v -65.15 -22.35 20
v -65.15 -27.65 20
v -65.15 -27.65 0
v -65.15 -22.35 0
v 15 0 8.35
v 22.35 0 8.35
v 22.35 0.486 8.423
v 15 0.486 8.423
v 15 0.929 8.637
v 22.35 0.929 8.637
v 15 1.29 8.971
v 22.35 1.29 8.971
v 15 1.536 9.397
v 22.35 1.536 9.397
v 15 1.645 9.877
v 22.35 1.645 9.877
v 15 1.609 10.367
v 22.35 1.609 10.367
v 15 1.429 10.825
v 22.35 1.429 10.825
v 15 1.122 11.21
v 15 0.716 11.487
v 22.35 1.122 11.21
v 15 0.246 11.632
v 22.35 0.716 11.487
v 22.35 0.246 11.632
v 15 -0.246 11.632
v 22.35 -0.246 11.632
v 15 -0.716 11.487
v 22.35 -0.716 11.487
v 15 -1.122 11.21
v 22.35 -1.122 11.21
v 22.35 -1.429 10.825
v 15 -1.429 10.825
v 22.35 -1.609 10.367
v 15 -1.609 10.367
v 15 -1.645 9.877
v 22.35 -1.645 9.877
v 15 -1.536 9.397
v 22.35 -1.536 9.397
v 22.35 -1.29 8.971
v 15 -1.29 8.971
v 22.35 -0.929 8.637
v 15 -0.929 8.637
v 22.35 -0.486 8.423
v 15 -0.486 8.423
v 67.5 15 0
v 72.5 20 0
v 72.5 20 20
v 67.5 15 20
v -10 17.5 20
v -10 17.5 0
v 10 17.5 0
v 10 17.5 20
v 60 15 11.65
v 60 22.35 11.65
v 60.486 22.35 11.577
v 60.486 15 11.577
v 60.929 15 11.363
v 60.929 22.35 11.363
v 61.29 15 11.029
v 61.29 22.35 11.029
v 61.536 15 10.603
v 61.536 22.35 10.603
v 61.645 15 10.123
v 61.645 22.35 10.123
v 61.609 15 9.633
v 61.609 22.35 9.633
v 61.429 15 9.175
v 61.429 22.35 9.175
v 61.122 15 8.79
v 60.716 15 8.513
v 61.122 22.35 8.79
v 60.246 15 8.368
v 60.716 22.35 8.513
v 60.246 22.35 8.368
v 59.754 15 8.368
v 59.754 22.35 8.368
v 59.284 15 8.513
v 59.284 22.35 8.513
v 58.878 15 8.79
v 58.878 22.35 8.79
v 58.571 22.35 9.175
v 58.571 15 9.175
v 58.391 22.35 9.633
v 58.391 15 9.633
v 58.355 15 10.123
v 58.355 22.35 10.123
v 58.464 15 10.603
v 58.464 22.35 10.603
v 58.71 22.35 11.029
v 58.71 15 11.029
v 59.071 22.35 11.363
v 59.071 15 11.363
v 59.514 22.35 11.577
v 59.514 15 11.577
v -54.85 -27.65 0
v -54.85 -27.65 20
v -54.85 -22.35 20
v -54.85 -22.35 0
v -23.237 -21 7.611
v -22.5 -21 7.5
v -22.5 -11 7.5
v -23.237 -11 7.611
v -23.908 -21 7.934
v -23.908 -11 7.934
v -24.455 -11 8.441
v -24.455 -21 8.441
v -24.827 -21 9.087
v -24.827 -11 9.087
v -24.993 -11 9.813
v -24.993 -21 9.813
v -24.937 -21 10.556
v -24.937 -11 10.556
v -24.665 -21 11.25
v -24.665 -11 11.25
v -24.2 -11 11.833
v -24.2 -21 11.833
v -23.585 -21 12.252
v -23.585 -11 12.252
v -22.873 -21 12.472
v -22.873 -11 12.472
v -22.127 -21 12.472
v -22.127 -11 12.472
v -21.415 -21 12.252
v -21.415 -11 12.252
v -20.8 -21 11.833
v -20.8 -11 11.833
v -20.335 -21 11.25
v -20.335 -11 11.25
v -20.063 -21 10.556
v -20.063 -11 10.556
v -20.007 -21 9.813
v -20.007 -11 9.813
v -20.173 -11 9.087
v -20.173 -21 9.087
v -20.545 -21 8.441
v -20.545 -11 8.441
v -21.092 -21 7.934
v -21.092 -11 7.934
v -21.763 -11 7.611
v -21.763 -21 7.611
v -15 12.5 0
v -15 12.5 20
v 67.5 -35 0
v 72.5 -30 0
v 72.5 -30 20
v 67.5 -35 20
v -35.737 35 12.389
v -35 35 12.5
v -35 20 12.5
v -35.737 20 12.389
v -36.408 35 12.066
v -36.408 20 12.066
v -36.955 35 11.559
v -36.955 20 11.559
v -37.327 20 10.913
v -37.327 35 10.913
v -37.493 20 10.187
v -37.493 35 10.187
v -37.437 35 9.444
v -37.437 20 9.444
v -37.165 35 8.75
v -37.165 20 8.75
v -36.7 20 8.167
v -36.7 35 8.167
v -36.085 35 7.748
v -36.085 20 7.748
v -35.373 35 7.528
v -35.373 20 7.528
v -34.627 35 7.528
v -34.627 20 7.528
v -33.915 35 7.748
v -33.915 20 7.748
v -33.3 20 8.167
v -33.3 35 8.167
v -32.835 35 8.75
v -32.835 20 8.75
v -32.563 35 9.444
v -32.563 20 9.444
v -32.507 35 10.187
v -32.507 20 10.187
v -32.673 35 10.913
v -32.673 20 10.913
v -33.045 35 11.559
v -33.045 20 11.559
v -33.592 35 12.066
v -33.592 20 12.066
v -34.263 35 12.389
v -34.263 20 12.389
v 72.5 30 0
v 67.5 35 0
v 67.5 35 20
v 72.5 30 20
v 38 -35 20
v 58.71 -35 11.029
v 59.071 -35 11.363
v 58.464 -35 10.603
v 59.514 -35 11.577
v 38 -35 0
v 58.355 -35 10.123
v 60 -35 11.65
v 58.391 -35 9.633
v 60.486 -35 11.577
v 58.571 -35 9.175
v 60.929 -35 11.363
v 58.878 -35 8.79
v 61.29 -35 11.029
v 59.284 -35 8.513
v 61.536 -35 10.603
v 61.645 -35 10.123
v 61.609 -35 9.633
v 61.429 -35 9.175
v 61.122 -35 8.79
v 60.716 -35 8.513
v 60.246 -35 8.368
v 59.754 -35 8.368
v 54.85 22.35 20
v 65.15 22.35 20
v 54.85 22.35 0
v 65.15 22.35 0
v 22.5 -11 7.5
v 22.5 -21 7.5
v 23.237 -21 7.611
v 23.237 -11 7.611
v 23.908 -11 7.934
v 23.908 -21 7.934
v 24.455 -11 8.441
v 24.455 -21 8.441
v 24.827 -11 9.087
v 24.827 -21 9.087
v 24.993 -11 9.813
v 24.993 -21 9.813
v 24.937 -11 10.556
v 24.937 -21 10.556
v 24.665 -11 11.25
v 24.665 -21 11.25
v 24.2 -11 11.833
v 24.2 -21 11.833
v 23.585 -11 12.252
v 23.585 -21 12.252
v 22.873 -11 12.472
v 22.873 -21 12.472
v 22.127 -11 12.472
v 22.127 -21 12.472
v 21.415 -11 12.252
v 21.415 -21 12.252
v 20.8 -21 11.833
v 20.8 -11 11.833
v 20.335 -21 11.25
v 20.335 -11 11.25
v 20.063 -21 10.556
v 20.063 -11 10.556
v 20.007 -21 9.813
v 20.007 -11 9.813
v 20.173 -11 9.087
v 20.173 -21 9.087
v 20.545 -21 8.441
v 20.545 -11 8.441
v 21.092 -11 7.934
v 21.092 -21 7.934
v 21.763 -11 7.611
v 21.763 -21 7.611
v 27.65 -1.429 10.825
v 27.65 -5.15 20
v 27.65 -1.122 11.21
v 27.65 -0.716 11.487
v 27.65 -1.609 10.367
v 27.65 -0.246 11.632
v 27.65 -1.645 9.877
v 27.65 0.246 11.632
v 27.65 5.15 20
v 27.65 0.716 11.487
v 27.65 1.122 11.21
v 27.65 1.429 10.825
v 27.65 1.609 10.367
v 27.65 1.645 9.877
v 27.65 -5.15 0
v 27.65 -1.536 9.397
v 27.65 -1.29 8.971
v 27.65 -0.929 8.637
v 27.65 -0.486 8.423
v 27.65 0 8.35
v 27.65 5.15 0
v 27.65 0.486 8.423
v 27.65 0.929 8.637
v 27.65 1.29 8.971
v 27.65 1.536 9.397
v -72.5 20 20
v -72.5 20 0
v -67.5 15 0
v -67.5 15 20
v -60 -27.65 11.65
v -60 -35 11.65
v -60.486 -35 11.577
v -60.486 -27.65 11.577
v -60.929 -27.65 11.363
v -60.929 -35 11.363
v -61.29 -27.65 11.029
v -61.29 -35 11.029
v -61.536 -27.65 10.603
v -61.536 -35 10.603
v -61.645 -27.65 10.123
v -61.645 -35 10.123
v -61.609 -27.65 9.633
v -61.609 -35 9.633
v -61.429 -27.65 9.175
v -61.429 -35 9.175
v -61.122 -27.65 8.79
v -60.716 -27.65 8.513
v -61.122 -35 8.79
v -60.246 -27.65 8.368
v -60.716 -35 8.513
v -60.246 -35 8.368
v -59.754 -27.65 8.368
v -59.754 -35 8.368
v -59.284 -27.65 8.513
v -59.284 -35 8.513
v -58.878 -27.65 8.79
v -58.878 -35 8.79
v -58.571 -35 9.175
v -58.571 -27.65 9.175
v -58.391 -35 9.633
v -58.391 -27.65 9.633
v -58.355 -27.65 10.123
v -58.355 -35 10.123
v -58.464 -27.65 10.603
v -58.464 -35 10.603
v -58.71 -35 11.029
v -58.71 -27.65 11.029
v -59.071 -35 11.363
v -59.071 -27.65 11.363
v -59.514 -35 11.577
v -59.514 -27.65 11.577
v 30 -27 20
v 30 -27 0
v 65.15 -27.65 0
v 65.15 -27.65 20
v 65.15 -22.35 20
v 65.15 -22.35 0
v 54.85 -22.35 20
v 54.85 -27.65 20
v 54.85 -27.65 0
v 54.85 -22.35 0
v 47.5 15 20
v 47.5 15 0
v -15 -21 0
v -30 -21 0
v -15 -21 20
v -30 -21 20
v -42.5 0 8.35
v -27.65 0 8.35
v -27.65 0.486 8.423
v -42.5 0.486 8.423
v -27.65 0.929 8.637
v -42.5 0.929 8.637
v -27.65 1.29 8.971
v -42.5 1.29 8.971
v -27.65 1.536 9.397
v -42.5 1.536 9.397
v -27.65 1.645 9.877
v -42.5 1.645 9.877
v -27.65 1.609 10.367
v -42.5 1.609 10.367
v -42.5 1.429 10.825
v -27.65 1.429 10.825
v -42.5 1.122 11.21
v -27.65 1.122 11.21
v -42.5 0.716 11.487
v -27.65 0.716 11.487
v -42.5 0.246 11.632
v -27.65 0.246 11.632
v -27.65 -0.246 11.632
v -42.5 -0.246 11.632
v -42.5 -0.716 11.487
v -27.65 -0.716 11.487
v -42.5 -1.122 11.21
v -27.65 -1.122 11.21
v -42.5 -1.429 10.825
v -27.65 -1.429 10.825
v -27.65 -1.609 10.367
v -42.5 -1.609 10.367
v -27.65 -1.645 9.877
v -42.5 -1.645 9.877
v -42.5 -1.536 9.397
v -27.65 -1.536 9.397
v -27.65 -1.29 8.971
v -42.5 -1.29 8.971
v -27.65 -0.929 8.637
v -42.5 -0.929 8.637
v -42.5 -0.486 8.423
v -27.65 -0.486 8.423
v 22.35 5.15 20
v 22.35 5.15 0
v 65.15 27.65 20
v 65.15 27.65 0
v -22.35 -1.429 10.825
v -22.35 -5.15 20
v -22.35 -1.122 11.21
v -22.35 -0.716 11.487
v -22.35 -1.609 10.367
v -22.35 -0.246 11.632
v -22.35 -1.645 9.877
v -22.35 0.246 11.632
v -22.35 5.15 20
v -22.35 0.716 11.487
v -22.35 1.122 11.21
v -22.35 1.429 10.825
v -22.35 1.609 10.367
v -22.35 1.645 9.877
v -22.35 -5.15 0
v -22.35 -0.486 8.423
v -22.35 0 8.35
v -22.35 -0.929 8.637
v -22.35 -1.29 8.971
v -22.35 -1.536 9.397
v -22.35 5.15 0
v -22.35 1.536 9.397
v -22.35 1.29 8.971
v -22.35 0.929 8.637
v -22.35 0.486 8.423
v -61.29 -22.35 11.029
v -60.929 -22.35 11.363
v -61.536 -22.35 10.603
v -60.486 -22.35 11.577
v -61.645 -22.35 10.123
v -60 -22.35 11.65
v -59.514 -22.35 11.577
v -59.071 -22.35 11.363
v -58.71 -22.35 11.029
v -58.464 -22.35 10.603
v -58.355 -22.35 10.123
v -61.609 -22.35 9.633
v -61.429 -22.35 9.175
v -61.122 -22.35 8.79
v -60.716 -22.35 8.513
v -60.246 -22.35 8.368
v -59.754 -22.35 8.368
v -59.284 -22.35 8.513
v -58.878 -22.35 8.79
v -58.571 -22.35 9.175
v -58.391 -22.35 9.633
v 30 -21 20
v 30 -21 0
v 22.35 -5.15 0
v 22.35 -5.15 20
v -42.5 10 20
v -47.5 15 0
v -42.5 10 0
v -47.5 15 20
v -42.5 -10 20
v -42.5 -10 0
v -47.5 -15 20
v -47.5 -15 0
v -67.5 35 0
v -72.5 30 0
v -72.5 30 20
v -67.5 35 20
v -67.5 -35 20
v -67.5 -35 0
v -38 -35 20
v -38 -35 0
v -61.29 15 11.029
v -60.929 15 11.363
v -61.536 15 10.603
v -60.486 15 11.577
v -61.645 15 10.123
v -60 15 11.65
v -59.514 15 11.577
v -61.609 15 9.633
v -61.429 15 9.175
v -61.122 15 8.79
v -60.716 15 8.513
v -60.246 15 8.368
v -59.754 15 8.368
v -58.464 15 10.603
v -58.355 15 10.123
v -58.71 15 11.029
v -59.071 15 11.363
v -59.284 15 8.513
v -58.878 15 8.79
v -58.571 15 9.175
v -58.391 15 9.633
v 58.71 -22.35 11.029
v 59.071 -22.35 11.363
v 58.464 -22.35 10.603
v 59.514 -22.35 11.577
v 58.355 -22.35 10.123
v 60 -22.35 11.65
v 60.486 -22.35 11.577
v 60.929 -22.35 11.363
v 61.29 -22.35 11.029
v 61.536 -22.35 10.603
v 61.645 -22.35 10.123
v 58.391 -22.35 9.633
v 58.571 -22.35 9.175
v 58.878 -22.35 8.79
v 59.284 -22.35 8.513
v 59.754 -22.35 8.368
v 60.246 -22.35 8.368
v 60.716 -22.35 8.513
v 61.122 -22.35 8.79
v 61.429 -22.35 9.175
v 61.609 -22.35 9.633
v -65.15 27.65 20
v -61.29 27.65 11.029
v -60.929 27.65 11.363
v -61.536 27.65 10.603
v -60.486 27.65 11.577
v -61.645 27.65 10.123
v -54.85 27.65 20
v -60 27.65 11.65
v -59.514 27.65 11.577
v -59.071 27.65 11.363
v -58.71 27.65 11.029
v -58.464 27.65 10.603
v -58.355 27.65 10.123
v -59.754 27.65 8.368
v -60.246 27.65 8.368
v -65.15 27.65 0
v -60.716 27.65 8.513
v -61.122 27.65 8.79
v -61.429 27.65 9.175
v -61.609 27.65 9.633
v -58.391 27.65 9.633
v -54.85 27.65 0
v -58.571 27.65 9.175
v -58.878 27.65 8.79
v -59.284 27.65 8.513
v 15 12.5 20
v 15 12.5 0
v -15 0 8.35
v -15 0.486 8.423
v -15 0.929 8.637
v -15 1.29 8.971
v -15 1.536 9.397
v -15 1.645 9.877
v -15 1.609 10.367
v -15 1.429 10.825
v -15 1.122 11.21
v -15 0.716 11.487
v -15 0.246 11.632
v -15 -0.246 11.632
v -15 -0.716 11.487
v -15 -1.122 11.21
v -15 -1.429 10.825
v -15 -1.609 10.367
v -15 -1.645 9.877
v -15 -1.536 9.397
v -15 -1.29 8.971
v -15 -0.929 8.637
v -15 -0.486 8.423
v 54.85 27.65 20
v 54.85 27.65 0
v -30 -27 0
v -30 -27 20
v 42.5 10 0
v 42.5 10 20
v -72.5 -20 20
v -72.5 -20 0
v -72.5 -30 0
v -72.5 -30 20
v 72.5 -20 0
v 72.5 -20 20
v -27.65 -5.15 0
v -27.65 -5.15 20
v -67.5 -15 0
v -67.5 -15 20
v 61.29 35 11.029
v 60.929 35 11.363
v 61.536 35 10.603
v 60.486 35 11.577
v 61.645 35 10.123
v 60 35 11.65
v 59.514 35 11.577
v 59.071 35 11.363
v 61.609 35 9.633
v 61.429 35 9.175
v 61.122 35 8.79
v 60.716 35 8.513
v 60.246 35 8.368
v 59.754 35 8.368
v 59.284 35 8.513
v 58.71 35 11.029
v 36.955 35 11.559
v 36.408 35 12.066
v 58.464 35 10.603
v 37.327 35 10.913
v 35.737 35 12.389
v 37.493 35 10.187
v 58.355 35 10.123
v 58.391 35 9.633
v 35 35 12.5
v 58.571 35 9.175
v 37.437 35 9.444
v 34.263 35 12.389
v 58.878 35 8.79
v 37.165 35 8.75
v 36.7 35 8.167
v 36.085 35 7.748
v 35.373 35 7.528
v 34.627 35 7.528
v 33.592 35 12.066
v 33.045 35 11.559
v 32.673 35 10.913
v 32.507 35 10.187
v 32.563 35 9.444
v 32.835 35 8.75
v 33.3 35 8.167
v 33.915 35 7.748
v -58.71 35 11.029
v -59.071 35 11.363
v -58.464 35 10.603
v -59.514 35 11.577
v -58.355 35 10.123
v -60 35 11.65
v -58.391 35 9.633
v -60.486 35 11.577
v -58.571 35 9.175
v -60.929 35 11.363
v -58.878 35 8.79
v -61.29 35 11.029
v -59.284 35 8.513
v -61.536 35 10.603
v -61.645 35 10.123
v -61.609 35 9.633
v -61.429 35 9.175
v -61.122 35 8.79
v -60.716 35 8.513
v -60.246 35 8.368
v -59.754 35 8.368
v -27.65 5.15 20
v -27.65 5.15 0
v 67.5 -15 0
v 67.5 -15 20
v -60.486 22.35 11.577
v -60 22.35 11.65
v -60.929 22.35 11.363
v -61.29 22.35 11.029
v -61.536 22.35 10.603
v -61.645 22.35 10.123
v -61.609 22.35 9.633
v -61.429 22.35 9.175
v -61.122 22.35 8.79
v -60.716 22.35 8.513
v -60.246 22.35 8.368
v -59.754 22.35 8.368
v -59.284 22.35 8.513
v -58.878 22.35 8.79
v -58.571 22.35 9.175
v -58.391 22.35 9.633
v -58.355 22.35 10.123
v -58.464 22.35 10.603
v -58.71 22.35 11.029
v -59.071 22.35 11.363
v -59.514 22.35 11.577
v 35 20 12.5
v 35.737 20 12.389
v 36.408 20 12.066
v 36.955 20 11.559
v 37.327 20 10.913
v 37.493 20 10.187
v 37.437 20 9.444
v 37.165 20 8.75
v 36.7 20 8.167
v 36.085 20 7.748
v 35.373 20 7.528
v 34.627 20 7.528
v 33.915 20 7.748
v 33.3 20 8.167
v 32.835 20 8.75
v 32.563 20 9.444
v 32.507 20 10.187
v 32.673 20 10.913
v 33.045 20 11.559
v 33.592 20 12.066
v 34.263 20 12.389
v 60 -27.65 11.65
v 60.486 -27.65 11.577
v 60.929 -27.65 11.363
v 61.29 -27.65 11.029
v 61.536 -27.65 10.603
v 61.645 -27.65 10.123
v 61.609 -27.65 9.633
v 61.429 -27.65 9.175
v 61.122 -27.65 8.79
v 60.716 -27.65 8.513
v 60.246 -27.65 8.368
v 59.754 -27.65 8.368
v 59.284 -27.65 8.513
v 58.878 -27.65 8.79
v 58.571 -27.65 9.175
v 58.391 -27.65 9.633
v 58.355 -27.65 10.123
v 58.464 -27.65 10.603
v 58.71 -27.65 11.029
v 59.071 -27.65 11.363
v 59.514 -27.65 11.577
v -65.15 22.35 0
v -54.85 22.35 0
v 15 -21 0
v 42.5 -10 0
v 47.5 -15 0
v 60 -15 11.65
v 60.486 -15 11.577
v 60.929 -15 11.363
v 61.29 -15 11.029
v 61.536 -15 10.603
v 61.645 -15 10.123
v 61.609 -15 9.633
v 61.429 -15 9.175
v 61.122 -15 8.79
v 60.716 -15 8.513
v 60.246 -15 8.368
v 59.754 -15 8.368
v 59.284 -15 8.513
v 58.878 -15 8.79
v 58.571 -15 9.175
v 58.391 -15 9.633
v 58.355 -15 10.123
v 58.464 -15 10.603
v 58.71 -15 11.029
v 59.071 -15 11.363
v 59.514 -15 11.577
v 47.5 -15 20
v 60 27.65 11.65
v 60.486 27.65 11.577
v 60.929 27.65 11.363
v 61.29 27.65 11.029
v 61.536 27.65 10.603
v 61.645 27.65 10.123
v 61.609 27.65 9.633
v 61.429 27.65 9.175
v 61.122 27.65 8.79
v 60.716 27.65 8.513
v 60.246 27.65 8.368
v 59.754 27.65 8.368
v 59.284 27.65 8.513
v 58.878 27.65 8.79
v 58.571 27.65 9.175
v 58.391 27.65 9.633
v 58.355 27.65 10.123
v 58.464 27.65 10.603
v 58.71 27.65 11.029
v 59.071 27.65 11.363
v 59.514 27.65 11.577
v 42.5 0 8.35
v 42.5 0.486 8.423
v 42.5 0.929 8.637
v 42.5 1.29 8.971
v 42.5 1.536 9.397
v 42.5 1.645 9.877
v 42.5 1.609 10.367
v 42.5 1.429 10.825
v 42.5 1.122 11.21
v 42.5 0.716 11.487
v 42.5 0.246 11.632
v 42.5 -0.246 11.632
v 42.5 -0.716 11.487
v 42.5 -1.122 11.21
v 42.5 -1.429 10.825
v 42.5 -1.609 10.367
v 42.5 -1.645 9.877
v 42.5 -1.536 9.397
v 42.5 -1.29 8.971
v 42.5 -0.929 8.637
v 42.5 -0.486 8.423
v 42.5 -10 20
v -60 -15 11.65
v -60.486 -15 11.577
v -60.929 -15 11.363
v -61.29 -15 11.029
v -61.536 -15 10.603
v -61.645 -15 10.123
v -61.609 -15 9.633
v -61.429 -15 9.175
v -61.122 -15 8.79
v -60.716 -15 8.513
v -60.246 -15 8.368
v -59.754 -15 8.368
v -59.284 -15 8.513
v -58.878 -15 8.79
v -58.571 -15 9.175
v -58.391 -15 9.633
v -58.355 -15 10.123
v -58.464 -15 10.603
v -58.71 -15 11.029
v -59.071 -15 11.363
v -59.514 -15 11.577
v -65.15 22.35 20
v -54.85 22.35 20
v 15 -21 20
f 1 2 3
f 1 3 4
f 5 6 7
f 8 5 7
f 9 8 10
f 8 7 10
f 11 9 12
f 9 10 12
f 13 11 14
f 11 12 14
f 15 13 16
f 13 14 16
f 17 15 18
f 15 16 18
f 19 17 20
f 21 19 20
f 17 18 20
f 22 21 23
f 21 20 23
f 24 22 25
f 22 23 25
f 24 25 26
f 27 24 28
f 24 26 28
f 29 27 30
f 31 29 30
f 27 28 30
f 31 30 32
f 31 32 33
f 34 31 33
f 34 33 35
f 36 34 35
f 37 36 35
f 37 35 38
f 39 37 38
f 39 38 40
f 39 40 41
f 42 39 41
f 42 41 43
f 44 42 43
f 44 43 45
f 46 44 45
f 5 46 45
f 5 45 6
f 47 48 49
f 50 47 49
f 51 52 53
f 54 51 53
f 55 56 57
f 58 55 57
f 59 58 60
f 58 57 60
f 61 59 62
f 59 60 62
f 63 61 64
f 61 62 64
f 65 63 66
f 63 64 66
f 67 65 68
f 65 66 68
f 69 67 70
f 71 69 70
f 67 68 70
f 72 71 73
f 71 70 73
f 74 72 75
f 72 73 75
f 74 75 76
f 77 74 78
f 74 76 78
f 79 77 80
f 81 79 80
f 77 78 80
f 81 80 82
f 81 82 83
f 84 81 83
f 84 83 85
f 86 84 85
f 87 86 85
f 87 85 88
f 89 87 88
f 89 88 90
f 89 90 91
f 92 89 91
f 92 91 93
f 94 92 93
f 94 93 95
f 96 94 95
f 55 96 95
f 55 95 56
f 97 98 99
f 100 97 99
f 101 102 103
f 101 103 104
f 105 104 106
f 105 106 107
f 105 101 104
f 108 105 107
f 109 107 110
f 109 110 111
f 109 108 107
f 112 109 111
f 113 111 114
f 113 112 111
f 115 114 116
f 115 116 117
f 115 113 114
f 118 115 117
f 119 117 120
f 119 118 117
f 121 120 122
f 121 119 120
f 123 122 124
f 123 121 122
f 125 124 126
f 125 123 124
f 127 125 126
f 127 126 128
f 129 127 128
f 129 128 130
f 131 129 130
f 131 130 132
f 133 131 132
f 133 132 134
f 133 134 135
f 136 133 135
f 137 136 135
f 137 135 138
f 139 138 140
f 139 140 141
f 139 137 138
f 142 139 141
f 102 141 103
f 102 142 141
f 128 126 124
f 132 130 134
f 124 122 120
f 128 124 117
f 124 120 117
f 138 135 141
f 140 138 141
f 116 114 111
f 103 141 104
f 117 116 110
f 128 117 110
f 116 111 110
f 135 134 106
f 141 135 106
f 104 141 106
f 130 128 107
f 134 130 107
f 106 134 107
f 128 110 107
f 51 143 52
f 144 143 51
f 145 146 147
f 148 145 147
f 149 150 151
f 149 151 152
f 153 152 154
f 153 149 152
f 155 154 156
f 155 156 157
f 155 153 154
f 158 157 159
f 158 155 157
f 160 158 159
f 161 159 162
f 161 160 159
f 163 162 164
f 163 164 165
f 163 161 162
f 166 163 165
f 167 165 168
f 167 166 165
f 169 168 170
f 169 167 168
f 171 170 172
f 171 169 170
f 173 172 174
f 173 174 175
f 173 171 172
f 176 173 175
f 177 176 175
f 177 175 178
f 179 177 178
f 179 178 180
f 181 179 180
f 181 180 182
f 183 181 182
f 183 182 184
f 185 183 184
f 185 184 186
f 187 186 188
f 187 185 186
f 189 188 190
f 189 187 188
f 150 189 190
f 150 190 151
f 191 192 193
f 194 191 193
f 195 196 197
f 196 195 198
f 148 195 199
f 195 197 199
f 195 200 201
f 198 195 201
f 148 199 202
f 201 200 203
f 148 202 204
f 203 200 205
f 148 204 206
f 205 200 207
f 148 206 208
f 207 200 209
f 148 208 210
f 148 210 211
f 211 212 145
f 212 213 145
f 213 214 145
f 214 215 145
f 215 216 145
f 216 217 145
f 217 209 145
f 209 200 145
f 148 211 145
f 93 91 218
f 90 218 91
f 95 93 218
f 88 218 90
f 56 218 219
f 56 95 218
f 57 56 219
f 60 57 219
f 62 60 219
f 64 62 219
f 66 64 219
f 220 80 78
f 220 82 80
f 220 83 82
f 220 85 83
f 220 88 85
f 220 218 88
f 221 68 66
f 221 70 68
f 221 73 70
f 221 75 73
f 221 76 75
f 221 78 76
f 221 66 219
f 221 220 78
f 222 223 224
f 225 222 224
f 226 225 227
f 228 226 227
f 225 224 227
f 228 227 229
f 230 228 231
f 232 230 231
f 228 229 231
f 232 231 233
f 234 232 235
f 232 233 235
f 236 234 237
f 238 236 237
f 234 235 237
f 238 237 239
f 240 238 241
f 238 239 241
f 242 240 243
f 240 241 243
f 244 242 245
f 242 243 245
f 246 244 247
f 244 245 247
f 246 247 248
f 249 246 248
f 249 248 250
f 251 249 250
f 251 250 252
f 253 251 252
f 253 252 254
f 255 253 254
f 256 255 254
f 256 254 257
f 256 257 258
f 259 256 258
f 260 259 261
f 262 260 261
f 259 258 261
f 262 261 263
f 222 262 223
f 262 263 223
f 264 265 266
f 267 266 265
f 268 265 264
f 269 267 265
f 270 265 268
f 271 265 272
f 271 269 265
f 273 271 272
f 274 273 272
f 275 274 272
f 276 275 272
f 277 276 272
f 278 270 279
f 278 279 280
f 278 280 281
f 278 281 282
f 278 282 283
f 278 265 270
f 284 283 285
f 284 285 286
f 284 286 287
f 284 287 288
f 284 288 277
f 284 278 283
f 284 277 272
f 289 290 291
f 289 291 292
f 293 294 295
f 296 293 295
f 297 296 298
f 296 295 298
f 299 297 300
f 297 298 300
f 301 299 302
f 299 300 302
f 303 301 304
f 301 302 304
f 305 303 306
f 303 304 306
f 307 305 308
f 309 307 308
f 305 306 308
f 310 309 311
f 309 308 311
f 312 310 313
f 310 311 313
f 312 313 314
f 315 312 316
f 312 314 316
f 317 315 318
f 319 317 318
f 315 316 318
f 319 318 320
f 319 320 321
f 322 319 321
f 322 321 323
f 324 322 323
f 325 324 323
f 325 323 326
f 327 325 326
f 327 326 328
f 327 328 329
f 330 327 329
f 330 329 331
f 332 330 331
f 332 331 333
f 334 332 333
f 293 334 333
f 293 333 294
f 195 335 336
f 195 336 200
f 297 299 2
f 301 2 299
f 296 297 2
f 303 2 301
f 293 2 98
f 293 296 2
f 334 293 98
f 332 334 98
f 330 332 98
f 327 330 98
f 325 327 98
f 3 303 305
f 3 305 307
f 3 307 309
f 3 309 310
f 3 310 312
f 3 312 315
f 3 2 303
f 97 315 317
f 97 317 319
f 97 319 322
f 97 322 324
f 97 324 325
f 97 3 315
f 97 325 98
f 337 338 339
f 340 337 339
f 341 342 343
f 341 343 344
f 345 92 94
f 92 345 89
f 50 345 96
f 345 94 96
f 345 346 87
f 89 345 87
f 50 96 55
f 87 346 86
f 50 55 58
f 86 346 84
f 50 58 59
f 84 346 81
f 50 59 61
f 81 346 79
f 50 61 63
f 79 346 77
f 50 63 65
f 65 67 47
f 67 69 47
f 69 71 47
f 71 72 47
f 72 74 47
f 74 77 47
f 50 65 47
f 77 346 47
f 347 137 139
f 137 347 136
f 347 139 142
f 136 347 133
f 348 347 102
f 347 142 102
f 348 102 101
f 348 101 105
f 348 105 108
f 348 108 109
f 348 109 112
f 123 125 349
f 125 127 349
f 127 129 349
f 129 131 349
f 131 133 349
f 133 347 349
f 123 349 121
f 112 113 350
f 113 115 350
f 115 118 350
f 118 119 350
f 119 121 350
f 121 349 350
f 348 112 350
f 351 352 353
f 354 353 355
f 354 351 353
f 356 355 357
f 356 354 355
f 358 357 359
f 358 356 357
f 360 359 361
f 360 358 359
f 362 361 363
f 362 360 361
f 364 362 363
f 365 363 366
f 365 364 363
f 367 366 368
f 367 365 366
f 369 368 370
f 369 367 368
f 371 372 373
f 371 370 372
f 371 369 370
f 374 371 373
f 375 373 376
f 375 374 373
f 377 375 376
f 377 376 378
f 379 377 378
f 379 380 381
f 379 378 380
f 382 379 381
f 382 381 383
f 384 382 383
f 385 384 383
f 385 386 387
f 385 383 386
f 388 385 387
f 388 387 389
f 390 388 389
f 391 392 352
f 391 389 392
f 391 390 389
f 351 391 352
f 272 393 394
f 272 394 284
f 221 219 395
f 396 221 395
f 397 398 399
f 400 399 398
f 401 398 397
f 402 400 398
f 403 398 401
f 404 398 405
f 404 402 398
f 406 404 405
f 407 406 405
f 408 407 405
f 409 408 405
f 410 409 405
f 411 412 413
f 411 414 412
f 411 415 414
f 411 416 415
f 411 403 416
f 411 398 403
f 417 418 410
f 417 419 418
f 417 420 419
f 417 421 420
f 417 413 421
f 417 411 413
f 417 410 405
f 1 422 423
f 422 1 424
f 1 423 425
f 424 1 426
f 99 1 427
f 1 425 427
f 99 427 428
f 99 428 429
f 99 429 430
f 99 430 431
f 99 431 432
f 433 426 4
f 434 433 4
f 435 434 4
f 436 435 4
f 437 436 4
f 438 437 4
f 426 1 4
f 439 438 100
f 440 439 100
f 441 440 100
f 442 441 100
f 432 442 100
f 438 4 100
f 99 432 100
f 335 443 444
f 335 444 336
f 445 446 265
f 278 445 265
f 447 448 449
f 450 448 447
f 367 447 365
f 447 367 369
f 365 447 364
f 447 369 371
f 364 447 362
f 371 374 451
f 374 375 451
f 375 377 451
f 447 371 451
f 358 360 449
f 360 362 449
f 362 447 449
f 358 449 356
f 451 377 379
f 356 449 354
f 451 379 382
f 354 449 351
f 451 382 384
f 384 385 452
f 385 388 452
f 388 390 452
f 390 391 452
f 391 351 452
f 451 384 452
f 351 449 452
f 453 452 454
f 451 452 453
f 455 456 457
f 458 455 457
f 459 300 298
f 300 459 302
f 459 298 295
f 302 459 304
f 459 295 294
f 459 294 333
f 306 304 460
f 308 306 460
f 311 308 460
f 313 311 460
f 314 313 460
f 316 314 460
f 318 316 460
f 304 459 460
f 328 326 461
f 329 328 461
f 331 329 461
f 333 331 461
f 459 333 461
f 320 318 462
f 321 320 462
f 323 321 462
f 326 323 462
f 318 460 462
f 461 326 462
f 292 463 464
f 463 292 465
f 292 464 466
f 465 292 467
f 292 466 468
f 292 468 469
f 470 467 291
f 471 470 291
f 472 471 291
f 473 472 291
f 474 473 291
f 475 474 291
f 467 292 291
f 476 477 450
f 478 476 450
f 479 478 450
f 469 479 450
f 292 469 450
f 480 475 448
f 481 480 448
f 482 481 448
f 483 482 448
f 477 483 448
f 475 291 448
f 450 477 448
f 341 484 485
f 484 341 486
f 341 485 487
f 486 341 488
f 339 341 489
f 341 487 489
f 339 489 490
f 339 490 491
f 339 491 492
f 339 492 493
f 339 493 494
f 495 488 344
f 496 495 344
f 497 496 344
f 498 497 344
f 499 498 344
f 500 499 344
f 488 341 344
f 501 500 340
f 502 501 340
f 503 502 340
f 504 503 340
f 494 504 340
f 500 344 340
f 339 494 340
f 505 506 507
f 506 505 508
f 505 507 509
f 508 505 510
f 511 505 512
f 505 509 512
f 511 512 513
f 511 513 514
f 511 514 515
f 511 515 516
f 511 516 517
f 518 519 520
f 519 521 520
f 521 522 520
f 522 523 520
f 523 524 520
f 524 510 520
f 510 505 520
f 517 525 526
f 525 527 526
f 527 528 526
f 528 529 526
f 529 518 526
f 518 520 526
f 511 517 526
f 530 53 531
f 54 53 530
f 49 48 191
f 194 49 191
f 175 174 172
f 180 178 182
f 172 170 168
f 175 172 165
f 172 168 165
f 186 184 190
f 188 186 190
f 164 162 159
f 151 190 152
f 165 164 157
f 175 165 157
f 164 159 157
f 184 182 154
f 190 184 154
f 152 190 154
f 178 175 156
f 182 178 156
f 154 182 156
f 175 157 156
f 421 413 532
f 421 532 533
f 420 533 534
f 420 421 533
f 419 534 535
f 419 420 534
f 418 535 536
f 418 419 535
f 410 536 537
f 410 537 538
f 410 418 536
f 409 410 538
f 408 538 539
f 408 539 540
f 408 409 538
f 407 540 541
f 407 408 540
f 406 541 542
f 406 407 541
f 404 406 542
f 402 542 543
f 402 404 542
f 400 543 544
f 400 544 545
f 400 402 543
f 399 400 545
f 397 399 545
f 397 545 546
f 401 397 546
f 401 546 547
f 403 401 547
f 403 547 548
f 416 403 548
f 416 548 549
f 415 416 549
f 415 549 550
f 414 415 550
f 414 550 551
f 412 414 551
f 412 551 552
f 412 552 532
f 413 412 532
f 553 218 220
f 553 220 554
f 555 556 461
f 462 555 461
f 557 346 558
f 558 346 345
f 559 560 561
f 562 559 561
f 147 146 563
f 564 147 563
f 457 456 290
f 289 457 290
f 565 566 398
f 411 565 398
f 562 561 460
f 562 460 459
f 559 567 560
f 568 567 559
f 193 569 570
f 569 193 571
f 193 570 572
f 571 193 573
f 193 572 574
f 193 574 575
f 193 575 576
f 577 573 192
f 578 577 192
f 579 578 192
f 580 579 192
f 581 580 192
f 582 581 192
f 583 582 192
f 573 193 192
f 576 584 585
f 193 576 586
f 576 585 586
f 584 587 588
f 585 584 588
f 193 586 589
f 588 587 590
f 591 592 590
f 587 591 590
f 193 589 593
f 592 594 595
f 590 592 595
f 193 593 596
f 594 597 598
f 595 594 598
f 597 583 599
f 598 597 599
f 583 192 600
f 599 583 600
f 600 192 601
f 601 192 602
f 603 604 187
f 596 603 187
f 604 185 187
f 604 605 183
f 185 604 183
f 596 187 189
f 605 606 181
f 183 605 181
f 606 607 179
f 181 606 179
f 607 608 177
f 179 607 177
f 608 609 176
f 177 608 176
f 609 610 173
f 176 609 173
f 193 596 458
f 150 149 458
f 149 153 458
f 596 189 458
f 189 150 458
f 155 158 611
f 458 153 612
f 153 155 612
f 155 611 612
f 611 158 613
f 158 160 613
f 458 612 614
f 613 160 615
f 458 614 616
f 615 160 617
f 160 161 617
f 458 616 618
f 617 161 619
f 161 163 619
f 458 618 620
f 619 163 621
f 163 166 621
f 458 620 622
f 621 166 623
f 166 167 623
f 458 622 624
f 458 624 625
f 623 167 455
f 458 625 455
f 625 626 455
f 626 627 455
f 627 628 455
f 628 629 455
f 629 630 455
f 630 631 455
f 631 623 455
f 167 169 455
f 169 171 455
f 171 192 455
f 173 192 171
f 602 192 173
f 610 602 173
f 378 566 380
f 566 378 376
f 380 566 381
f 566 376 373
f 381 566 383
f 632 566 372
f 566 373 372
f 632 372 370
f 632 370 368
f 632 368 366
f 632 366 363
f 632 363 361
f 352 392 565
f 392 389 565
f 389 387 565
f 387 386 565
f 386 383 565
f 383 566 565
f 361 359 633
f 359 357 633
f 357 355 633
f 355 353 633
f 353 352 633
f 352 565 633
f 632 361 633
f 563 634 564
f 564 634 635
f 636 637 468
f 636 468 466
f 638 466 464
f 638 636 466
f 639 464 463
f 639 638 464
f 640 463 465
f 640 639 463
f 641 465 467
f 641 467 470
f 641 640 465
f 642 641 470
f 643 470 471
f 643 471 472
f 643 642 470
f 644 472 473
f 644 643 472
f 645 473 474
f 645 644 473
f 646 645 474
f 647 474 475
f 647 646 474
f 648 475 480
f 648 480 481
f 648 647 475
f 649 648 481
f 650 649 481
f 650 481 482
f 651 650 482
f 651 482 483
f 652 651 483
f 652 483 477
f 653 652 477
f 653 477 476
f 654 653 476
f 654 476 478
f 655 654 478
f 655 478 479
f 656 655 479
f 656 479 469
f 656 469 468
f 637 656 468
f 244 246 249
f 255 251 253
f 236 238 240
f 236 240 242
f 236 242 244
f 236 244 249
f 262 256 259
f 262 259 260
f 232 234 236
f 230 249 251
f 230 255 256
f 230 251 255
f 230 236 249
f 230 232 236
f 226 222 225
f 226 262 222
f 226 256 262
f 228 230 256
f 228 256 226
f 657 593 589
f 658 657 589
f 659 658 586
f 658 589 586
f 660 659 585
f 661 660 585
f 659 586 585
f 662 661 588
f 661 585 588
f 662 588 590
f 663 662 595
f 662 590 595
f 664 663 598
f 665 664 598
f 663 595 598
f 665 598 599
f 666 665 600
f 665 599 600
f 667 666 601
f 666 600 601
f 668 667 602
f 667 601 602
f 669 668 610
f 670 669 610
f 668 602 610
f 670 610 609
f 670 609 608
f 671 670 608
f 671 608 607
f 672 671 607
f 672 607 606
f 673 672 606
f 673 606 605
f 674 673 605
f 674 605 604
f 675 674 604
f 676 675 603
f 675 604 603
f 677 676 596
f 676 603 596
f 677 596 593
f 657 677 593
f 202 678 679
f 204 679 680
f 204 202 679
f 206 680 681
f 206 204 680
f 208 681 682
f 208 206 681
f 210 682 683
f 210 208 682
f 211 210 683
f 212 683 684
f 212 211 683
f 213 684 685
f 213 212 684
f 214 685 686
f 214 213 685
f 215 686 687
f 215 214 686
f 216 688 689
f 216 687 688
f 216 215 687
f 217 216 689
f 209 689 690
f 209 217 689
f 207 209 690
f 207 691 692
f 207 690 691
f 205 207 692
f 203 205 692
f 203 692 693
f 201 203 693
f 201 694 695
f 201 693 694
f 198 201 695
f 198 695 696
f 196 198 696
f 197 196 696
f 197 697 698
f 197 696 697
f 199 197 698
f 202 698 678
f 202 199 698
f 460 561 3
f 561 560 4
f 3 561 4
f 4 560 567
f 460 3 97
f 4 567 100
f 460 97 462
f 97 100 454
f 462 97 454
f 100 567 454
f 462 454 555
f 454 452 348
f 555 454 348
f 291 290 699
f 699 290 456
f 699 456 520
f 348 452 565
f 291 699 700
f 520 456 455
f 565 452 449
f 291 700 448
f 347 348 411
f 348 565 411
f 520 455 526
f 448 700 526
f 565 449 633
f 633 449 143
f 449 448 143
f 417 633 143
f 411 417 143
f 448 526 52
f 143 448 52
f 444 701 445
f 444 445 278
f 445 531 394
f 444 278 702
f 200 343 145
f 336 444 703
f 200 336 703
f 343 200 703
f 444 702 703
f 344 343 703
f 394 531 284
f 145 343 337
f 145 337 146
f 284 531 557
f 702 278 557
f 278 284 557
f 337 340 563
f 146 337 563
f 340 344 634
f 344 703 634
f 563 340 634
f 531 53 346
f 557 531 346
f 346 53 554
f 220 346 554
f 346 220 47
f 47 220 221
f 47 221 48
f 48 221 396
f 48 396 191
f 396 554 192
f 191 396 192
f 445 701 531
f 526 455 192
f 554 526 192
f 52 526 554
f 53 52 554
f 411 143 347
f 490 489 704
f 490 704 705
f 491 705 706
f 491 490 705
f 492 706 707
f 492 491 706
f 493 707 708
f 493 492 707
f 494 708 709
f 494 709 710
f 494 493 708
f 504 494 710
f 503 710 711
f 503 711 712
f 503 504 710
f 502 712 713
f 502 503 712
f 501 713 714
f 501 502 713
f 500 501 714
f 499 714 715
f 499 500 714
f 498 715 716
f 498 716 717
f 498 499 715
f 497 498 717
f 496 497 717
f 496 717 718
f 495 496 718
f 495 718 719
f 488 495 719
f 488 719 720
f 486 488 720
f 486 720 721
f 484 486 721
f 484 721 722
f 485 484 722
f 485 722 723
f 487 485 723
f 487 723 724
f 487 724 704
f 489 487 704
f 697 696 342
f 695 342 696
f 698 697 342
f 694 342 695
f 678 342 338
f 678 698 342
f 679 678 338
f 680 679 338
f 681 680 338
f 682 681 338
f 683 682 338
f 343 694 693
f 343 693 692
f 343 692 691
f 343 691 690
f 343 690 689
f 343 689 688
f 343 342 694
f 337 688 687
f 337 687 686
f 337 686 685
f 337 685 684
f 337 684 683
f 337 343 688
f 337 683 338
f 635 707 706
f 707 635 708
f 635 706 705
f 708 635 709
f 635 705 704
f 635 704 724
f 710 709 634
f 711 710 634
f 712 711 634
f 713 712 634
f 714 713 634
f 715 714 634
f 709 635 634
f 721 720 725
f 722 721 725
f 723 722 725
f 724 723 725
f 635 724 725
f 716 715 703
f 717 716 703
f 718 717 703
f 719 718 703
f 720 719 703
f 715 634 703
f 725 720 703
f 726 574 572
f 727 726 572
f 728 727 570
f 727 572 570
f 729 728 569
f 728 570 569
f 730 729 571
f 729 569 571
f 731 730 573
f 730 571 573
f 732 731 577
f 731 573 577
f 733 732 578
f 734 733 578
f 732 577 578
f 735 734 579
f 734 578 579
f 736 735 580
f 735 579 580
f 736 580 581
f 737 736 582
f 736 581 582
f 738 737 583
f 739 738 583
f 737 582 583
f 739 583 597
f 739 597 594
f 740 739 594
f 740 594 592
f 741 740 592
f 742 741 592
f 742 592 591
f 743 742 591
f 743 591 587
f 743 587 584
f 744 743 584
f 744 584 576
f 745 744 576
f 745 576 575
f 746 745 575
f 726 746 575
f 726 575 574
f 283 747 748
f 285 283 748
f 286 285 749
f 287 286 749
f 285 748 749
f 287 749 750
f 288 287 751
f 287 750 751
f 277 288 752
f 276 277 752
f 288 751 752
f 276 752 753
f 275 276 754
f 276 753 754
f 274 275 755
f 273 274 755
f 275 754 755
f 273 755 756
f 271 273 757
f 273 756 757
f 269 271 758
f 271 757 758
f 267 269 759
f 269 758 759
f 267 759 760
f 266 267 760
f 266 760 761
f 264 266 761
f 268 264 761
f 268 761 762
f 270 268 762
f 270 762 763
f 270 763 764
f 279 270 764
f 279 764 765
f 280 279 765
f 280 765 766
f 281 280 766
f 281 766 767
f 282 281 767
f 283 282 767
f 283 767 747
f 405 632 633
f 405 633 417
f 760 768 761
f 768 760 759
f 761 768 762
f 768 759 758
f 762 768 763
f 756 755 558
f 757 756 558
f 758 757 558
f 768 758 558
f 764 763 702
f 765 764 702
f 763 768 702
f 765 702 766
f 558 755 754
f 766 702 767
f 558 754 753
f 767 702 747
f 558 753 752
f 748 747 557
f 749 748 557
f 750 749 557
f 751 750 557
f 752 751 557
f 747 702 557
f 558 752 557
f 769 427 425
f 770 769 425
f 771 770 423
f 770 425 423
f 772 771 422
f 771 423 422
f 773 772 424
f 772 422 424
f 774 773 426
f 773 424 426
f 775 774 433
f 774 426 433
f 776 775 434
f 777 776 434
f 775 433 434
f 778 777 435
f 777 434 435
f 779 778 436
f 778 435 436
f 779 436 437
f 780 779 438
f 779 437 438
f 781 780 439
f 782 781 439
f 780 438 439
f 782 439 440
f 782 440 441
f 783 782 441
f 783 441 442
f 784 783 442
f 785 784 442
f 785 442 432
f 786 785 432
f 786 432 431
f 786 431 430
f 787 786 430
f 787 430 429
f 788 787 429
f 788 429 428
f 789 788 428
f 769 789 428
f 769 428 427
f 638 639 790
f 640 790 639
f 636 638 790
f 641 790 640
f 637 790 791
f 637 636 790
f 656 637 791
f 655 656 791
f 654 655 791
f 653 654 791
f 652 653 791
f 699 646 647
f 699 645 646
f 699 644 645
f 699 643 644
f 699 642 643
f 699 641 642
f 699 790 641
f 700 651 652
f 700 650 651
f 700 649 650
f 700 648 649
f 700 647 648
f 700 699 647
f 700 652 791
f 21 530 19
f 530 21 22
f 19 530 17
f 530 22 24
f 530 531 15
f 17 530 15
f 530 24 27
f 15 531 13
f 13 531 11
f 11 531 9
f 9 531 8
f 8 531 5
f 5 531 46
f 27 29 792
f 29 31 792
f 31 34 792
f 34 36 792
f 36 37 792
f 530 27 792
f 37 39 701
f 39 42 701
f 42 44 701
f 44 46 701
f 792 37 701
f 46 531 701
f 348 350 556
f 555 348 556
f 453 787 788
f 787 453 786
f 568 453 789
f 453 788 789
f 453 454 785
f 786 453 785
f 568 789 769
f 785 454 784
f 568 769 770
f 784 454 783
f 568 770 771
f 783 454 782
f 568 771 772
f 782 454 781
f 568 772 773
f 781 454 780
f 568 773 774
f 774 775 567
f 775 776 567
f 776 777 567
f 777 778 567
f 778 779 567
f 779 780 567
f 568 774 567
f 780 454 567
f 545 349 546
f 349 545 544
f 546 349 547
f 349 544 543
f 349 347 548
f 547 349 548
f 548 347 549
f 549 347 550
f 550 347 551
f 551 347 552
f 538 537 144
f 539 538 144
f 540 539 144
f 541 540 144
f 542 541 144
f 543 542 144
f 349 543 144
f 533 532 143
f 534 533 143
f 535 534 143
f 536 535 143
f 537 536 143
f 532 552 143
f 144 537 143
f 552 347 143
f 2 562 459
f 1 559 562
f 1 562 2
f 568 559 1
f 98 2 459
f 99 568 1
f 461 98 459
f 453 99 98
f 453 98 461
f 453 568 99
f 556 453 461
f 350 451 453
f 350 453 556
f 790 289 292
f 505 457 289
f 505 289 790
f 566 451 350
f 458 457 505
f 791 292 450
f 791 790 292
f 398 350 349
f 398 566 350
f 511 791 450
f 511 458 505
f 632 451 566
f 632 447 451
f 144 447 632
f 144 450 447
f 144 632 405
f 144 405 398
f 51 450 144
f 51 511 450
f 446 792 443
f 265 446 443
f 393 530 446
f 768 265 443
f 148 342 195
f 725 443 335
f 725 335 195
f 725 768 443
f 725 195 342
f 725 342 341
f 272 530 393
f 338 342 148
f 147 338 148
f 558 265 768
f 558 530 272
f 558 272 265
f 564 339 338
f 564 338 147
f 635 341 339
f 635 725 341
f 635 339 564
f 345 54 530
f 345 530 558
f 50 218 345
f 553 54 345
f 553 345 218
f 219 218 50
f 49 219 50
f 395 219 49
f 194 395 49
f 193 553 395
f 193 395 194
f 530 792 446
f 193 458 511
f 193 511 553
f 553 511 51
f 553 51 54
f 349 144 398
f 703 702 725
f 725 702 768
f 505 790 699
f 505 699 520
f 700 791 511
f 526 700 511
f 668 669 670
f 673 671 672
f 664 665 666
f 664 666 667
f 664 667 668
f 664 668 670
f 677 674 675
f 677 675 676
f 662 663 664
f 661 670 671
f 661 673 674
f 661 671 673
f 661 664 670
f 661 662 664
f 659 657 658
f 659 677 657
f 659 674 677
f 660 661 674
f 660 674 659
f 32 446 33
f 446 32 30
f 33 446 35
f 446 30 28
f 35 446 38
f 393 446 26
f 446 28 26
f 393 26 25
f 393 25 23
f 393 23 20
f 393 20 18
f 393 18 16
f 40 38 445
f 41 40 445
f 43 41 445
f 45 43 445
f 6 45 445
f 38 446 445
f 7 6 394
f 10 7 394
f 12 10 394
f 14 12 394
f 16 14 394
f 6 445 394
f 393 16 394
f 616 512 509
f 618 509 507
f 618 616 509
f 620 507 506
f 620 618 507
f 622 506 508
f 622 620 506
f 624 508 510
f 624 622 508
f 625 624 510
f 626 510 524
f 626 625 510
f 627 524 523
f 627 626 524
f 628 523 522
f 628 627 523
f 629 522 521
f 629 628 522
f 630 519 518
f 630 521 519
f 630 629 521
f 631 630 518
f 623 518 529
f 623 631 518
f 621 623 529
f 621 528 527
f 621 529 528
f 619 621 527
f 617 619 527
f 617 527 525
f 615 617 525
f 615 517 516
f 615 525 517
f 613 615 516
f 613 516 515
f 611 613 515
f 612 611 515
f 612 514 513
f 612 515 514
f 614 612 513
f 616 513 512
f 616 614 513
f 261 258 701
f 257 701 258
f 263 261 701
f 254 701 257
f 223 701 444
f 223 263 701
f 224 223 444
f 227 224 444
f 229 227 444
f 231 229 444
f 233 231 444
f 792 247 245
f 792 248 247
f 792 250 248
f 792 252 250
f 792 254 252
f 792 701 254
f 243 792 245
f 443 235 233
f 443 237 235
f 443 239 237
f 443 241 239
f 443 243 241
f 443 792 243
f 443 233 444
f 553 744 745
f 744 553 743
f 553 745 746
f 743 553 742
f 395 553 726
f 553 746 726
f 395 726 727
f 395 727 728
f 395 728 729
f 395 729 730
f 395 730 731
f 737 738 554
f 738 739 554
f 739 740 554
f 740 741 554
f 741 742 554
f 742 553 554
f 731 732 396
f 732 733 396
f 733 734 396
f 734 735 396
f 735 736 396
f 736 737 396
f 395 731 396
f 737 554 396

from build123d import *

# Parameters (mm, degrees)
SKETCH_1_W               = 10.3
SKETCH_1_H               = 5.3
SKETCH_1_W_2             = 5.3
SKETCH_1_H_2             = 10.3
EXTRUDE_2_DEPTH          = 20
CHAMFER_1_SIZE           = 5
CUT_EXTRUDE_1_REACH      = 104.744
SKETCH_2_R               = 1.65
CUT_EXTRUDE_2_REACH      = 123.861
SKETCH_4_R               = 1.65
MIRROR_2_COPY_1_REACH    = 104.744
MIRROR_2_COPY_1_SKETCH_R = 1.65
SKETCH_7_R               = 2.5
CUT_EXTRUDE_4_DEPTH      = 15
CUT_EXTRUDE_7_REACH      = 84.953
SKETCH_11_R              = 2.5
CUT_EXTRUDE_8_DEPTH      = 10


with BuildPart() as part:
    # 草圖1 → 填料-伸長2 (new body)
    with BuildSketch(Plane.XY):
        Polygon((15, 17.5), (15, -35), (72.5, -35), (72.5, -15), (42.5, -15), (42.5, 15), (72.5, 15), (72.5, 35), (-72.5, 35), (-72.5, 15), (-42.5, 15), (-42.5, -15), (-72.5, -15), (-72.5, -35), (-15, -35), (-15, 17.5), align=None)
        with Locations((-60, -25)):
            Rectangle(SKETCH_1_W, SKETCH_1_H, mode=Mode.SUBTRACT)
        with Locations((-60, 25)):
            Rectangle(SKETCH_1_W, SKETCH_1_H, mode=Mode.SUBTRACT)
        with Locations((-25, 0)):
            Rectangle(SKETCH_1_W_2, SKETCH_1_H_2, mode=Mode.SUBTRACT)
        with Locations((60, -25)):
            Rectangle(SKETCH_1_W, SKETCH_1_H, mode=Mode.SUBTRACT)
        with Locations((25, 0)):
            Rectangle(SKETCH_1_W_2, SKETCH_1_H_2, mode=Mode.SUBTRACT)
        with Locations((60, 25)):
            Rectangle(SKETCH_1_W, SKETCH_1_H, mode=Mode.SUBTRACT)
    extrude(amount=EXTRUDE_2_DEPTH)

    # 導角1
    chamfer_1_edges = [part.edges().sort_by_distance(p)[0] for p in [
        (-15, 17.5, 10),
        (-72.5, -35, 10),
        (-72.5, -15, 10),
        (-42.5, -15, 10),
        (-42.5, 15, 10),
        (-72.5, 15, 10),
        (-72.5, 35, 10),
        (72.5, 35, 10),
        (72.5, 15, 10),
        (42.5, 15, 10),
        (42.5, -15, 10),
        (72.5, -15, 10),
        (72.5, -35, 10),
        (15, 17.5, 10),
    ]]
    chamfer(chamfer_1_edges, length=CHAMFER_1_SIZE)

    # 除料-伸長1: up to this face of the body (flat: up to its plane)
    cut_extrude_1_end = Plane(part.part.faces().sort_by_distance((57.5, 15, 10))[0])
    # 草圖2 → 除料-伸長1 (cut, up to the picked face)
    with BuildSketch(Plane(origin=(0, 35, 0), x_dir=(1, 0, 0), z_dir=(0, 1, 0)), mode=Mode.PRIVATE) as cut_extrude_1_sk1:
        with Locations(Location((60, -10, 0), (0, 0, 270))):
            Circle(SKETCH_2_R)
    cut_extrude_1_tool1 = split(extrude(cut_extrude_1_sk1.sketch, amount=-CUT_EXTRUDE_1_REACH, mode=Mode.PRIVATE), bisect_by=cut_extrude_1_end, keep=Keep.BOTH, mode=Mode.PRIVATE)
    cut_extrude_1 = cut_extrude_1_tool1.solids().sort_by(Axis((60, 35, 10), (0, -1, 0)))[0]
    add(cut_extrude_1, mode=Mode.SUBTRACT)

    # 除料-伸長2: up to this face of the body (flat: up to its plane)
    cut_extrude_2_end = Plane(part.part.faces().sort_by_distance((15, -11.25, 10))[0])
    # 草圖4 → 除料-伸長2 (cut, up to the picked face)
    with BuildSketch(Plane(origin=(42.5, 0, 0), x_dir=(0, 0, -1), z_dir=(1, 0, 0)), mode=Mode.PRIVATE) as cut_extrude_2_sk1:
        with Locations((-10, 0)):
            Circle(SKETCH_4_R)
    cut_extrude_2_tool1 = split(extrude(cut_extrude_2_sk1.sketch, amount=-CUT_EXTRUDE_2_REACH, mode=Mode.PRIVATE), bisect_by=cut_extrude_2_end, keep=Keep.BOTH, mode=Mode.PRIVATE)
    cut_extrude_2 = cut_extrude_2_tool1.solids().sort_by(Axis((42.5, 0, 10), (-1, 0, 0)))[0]
    add(cut_extrude_2, mode=Mode.SUBTRACT)

    # 鏡射1: 除料-伸長1 across plane
    add(cut_extrude_1.mirror(Plane.ZX), mode=Mode.SUBTRACT)

    # 鏡射2: 除料-伸長1, 除料-伸長2 across plane
    add(cut_extrude_1.mirror(Plane(origin=(0, 0, 0), x_dir=(0, 0, 1), z_dir=(1, 0, 0))), mode=Mode.SUBTRACT)
    add(cut_extrude_2.mirror(Plane(origin=(0, 0, 0), x_dir=(0, 0, 1), z_dir=(1, 0, 0))), mode=Mode.SUBTRACT)

    # 鏡射2 copy 1: up to this face of the body (flat: up to its plane)
    mirror_2_copy_1_end = Plane(part.part.faces().sort_by_distance((-57.5, -15, 10))[0])
    # 鏡射2 copy 1 sketch → 鏡射2 copy 1 (cut, up to the picked face)
    with BuildSketch(Plane(origin=(0, -35, 0), x_dir=(-1, 0, 0), z_dir=(0, -1, 0)), mode=Mode.PRIVATE) as mirror_2_copy_1_sk1:
        with Locations(Location((60, -10, 0), (0, 0, 270))):
            Circle(MIRROR_2_COPY_1_SKETCH_R)
    mirror_2_copy_1_tool1 = split(extrude(mirror_2_copy_1_sk1.sketch, amount=-MIRROR_2_COPY_1_REACH, mode=Mode.PRIVATE), bisect_by=mirror_2_copy_1_end, keep=Keep.BOTH, mode=Mode.PRIVATE)
    add(mirror_2_copy_1_tool1.solids().sort_by(Axis((-60, -35, 10), (0, 1, 0)))[0], mode=Mode.SUBTRACT)

    # 草圖7 → 除料-伸長4 (cut)
    with BuildSketch(Plane(origin=(0, 35, 0), x_dir=(1, 0, 0), z_dir=(0, 1, 0))):
        with Locations(Location((35, -10, 0), (0, 0, 270))):
            Circle(SKETCH_7_R)
    cut_extrude_4 = extrude(amount=-CUT_EXTRUDE_4_DEPTH, mode=Mode.SUBTRACT)

    # 鏡射9: 除料-伸長4 across plane
    add(cut_extrude_4.mirror(Plane(origin=(0, 0, 0), x_dir=(0, 0, 1), z_dir=(1, 0, 0))), mode=Mode.SUBTRACT)

    # 草圖10 → 除料-伸長7 (cut, up to next)
    with BuildSketch(Plane.XY.offset(20), mode=Mode.PRIVATE) as cut_extrude_7_sk1:
        Polygon((15, -35), (15, -21), (30, -21), (30, -27), (38, -35), (30, -35), align=None)
    cut_extrude_7_tool1 = extrude(cut_extrude_7_sk1.sketch, amount=-CUT_EXTRUDE_7_REACH, mode=Mode.PRIVATE) & part.part
    cut_extrude_7 = cut_extrude_7_tool1.solids().sort_by_distance((23.844353, -28.573003, 20))[0]
    add(cut_extrude_7, mode=Mode.SUBTRACT)

    # 草圖11 → 除料-伸長8 (cut)
    with BuildSketch(Plane(origin=(0, -21, 0), x_dir=(-1, 0, 0), z_dir=(0, -1, 0))):
        with Locations(Location((-22.5, -10, 0), (0, 0, 90))):
            Circle(SKETCH_11_R)
    cut_extrude_8 = extrude(amount=-CUT_EXTRUDE_8_DEPTH, mode=Mode.SUBTRACT)

    # 鏡射10: 除料-伸長7, 除料-伸長8 across plane
    add(cut_extrude_7.mirror(Plane(origin=(0, 0, 0), x_dir=(0, 0, 1), z_dir=(1, 0, 0))), mode=Mode.SUBTRACT)
    add(cut_extrude_8.mirror(Plane(origin=(0, 0, 0), x_dir=(0, 0, 1), z_dir=(1, 0, 0))), mode=Mode.SUBTRACT)


solid = part.part
